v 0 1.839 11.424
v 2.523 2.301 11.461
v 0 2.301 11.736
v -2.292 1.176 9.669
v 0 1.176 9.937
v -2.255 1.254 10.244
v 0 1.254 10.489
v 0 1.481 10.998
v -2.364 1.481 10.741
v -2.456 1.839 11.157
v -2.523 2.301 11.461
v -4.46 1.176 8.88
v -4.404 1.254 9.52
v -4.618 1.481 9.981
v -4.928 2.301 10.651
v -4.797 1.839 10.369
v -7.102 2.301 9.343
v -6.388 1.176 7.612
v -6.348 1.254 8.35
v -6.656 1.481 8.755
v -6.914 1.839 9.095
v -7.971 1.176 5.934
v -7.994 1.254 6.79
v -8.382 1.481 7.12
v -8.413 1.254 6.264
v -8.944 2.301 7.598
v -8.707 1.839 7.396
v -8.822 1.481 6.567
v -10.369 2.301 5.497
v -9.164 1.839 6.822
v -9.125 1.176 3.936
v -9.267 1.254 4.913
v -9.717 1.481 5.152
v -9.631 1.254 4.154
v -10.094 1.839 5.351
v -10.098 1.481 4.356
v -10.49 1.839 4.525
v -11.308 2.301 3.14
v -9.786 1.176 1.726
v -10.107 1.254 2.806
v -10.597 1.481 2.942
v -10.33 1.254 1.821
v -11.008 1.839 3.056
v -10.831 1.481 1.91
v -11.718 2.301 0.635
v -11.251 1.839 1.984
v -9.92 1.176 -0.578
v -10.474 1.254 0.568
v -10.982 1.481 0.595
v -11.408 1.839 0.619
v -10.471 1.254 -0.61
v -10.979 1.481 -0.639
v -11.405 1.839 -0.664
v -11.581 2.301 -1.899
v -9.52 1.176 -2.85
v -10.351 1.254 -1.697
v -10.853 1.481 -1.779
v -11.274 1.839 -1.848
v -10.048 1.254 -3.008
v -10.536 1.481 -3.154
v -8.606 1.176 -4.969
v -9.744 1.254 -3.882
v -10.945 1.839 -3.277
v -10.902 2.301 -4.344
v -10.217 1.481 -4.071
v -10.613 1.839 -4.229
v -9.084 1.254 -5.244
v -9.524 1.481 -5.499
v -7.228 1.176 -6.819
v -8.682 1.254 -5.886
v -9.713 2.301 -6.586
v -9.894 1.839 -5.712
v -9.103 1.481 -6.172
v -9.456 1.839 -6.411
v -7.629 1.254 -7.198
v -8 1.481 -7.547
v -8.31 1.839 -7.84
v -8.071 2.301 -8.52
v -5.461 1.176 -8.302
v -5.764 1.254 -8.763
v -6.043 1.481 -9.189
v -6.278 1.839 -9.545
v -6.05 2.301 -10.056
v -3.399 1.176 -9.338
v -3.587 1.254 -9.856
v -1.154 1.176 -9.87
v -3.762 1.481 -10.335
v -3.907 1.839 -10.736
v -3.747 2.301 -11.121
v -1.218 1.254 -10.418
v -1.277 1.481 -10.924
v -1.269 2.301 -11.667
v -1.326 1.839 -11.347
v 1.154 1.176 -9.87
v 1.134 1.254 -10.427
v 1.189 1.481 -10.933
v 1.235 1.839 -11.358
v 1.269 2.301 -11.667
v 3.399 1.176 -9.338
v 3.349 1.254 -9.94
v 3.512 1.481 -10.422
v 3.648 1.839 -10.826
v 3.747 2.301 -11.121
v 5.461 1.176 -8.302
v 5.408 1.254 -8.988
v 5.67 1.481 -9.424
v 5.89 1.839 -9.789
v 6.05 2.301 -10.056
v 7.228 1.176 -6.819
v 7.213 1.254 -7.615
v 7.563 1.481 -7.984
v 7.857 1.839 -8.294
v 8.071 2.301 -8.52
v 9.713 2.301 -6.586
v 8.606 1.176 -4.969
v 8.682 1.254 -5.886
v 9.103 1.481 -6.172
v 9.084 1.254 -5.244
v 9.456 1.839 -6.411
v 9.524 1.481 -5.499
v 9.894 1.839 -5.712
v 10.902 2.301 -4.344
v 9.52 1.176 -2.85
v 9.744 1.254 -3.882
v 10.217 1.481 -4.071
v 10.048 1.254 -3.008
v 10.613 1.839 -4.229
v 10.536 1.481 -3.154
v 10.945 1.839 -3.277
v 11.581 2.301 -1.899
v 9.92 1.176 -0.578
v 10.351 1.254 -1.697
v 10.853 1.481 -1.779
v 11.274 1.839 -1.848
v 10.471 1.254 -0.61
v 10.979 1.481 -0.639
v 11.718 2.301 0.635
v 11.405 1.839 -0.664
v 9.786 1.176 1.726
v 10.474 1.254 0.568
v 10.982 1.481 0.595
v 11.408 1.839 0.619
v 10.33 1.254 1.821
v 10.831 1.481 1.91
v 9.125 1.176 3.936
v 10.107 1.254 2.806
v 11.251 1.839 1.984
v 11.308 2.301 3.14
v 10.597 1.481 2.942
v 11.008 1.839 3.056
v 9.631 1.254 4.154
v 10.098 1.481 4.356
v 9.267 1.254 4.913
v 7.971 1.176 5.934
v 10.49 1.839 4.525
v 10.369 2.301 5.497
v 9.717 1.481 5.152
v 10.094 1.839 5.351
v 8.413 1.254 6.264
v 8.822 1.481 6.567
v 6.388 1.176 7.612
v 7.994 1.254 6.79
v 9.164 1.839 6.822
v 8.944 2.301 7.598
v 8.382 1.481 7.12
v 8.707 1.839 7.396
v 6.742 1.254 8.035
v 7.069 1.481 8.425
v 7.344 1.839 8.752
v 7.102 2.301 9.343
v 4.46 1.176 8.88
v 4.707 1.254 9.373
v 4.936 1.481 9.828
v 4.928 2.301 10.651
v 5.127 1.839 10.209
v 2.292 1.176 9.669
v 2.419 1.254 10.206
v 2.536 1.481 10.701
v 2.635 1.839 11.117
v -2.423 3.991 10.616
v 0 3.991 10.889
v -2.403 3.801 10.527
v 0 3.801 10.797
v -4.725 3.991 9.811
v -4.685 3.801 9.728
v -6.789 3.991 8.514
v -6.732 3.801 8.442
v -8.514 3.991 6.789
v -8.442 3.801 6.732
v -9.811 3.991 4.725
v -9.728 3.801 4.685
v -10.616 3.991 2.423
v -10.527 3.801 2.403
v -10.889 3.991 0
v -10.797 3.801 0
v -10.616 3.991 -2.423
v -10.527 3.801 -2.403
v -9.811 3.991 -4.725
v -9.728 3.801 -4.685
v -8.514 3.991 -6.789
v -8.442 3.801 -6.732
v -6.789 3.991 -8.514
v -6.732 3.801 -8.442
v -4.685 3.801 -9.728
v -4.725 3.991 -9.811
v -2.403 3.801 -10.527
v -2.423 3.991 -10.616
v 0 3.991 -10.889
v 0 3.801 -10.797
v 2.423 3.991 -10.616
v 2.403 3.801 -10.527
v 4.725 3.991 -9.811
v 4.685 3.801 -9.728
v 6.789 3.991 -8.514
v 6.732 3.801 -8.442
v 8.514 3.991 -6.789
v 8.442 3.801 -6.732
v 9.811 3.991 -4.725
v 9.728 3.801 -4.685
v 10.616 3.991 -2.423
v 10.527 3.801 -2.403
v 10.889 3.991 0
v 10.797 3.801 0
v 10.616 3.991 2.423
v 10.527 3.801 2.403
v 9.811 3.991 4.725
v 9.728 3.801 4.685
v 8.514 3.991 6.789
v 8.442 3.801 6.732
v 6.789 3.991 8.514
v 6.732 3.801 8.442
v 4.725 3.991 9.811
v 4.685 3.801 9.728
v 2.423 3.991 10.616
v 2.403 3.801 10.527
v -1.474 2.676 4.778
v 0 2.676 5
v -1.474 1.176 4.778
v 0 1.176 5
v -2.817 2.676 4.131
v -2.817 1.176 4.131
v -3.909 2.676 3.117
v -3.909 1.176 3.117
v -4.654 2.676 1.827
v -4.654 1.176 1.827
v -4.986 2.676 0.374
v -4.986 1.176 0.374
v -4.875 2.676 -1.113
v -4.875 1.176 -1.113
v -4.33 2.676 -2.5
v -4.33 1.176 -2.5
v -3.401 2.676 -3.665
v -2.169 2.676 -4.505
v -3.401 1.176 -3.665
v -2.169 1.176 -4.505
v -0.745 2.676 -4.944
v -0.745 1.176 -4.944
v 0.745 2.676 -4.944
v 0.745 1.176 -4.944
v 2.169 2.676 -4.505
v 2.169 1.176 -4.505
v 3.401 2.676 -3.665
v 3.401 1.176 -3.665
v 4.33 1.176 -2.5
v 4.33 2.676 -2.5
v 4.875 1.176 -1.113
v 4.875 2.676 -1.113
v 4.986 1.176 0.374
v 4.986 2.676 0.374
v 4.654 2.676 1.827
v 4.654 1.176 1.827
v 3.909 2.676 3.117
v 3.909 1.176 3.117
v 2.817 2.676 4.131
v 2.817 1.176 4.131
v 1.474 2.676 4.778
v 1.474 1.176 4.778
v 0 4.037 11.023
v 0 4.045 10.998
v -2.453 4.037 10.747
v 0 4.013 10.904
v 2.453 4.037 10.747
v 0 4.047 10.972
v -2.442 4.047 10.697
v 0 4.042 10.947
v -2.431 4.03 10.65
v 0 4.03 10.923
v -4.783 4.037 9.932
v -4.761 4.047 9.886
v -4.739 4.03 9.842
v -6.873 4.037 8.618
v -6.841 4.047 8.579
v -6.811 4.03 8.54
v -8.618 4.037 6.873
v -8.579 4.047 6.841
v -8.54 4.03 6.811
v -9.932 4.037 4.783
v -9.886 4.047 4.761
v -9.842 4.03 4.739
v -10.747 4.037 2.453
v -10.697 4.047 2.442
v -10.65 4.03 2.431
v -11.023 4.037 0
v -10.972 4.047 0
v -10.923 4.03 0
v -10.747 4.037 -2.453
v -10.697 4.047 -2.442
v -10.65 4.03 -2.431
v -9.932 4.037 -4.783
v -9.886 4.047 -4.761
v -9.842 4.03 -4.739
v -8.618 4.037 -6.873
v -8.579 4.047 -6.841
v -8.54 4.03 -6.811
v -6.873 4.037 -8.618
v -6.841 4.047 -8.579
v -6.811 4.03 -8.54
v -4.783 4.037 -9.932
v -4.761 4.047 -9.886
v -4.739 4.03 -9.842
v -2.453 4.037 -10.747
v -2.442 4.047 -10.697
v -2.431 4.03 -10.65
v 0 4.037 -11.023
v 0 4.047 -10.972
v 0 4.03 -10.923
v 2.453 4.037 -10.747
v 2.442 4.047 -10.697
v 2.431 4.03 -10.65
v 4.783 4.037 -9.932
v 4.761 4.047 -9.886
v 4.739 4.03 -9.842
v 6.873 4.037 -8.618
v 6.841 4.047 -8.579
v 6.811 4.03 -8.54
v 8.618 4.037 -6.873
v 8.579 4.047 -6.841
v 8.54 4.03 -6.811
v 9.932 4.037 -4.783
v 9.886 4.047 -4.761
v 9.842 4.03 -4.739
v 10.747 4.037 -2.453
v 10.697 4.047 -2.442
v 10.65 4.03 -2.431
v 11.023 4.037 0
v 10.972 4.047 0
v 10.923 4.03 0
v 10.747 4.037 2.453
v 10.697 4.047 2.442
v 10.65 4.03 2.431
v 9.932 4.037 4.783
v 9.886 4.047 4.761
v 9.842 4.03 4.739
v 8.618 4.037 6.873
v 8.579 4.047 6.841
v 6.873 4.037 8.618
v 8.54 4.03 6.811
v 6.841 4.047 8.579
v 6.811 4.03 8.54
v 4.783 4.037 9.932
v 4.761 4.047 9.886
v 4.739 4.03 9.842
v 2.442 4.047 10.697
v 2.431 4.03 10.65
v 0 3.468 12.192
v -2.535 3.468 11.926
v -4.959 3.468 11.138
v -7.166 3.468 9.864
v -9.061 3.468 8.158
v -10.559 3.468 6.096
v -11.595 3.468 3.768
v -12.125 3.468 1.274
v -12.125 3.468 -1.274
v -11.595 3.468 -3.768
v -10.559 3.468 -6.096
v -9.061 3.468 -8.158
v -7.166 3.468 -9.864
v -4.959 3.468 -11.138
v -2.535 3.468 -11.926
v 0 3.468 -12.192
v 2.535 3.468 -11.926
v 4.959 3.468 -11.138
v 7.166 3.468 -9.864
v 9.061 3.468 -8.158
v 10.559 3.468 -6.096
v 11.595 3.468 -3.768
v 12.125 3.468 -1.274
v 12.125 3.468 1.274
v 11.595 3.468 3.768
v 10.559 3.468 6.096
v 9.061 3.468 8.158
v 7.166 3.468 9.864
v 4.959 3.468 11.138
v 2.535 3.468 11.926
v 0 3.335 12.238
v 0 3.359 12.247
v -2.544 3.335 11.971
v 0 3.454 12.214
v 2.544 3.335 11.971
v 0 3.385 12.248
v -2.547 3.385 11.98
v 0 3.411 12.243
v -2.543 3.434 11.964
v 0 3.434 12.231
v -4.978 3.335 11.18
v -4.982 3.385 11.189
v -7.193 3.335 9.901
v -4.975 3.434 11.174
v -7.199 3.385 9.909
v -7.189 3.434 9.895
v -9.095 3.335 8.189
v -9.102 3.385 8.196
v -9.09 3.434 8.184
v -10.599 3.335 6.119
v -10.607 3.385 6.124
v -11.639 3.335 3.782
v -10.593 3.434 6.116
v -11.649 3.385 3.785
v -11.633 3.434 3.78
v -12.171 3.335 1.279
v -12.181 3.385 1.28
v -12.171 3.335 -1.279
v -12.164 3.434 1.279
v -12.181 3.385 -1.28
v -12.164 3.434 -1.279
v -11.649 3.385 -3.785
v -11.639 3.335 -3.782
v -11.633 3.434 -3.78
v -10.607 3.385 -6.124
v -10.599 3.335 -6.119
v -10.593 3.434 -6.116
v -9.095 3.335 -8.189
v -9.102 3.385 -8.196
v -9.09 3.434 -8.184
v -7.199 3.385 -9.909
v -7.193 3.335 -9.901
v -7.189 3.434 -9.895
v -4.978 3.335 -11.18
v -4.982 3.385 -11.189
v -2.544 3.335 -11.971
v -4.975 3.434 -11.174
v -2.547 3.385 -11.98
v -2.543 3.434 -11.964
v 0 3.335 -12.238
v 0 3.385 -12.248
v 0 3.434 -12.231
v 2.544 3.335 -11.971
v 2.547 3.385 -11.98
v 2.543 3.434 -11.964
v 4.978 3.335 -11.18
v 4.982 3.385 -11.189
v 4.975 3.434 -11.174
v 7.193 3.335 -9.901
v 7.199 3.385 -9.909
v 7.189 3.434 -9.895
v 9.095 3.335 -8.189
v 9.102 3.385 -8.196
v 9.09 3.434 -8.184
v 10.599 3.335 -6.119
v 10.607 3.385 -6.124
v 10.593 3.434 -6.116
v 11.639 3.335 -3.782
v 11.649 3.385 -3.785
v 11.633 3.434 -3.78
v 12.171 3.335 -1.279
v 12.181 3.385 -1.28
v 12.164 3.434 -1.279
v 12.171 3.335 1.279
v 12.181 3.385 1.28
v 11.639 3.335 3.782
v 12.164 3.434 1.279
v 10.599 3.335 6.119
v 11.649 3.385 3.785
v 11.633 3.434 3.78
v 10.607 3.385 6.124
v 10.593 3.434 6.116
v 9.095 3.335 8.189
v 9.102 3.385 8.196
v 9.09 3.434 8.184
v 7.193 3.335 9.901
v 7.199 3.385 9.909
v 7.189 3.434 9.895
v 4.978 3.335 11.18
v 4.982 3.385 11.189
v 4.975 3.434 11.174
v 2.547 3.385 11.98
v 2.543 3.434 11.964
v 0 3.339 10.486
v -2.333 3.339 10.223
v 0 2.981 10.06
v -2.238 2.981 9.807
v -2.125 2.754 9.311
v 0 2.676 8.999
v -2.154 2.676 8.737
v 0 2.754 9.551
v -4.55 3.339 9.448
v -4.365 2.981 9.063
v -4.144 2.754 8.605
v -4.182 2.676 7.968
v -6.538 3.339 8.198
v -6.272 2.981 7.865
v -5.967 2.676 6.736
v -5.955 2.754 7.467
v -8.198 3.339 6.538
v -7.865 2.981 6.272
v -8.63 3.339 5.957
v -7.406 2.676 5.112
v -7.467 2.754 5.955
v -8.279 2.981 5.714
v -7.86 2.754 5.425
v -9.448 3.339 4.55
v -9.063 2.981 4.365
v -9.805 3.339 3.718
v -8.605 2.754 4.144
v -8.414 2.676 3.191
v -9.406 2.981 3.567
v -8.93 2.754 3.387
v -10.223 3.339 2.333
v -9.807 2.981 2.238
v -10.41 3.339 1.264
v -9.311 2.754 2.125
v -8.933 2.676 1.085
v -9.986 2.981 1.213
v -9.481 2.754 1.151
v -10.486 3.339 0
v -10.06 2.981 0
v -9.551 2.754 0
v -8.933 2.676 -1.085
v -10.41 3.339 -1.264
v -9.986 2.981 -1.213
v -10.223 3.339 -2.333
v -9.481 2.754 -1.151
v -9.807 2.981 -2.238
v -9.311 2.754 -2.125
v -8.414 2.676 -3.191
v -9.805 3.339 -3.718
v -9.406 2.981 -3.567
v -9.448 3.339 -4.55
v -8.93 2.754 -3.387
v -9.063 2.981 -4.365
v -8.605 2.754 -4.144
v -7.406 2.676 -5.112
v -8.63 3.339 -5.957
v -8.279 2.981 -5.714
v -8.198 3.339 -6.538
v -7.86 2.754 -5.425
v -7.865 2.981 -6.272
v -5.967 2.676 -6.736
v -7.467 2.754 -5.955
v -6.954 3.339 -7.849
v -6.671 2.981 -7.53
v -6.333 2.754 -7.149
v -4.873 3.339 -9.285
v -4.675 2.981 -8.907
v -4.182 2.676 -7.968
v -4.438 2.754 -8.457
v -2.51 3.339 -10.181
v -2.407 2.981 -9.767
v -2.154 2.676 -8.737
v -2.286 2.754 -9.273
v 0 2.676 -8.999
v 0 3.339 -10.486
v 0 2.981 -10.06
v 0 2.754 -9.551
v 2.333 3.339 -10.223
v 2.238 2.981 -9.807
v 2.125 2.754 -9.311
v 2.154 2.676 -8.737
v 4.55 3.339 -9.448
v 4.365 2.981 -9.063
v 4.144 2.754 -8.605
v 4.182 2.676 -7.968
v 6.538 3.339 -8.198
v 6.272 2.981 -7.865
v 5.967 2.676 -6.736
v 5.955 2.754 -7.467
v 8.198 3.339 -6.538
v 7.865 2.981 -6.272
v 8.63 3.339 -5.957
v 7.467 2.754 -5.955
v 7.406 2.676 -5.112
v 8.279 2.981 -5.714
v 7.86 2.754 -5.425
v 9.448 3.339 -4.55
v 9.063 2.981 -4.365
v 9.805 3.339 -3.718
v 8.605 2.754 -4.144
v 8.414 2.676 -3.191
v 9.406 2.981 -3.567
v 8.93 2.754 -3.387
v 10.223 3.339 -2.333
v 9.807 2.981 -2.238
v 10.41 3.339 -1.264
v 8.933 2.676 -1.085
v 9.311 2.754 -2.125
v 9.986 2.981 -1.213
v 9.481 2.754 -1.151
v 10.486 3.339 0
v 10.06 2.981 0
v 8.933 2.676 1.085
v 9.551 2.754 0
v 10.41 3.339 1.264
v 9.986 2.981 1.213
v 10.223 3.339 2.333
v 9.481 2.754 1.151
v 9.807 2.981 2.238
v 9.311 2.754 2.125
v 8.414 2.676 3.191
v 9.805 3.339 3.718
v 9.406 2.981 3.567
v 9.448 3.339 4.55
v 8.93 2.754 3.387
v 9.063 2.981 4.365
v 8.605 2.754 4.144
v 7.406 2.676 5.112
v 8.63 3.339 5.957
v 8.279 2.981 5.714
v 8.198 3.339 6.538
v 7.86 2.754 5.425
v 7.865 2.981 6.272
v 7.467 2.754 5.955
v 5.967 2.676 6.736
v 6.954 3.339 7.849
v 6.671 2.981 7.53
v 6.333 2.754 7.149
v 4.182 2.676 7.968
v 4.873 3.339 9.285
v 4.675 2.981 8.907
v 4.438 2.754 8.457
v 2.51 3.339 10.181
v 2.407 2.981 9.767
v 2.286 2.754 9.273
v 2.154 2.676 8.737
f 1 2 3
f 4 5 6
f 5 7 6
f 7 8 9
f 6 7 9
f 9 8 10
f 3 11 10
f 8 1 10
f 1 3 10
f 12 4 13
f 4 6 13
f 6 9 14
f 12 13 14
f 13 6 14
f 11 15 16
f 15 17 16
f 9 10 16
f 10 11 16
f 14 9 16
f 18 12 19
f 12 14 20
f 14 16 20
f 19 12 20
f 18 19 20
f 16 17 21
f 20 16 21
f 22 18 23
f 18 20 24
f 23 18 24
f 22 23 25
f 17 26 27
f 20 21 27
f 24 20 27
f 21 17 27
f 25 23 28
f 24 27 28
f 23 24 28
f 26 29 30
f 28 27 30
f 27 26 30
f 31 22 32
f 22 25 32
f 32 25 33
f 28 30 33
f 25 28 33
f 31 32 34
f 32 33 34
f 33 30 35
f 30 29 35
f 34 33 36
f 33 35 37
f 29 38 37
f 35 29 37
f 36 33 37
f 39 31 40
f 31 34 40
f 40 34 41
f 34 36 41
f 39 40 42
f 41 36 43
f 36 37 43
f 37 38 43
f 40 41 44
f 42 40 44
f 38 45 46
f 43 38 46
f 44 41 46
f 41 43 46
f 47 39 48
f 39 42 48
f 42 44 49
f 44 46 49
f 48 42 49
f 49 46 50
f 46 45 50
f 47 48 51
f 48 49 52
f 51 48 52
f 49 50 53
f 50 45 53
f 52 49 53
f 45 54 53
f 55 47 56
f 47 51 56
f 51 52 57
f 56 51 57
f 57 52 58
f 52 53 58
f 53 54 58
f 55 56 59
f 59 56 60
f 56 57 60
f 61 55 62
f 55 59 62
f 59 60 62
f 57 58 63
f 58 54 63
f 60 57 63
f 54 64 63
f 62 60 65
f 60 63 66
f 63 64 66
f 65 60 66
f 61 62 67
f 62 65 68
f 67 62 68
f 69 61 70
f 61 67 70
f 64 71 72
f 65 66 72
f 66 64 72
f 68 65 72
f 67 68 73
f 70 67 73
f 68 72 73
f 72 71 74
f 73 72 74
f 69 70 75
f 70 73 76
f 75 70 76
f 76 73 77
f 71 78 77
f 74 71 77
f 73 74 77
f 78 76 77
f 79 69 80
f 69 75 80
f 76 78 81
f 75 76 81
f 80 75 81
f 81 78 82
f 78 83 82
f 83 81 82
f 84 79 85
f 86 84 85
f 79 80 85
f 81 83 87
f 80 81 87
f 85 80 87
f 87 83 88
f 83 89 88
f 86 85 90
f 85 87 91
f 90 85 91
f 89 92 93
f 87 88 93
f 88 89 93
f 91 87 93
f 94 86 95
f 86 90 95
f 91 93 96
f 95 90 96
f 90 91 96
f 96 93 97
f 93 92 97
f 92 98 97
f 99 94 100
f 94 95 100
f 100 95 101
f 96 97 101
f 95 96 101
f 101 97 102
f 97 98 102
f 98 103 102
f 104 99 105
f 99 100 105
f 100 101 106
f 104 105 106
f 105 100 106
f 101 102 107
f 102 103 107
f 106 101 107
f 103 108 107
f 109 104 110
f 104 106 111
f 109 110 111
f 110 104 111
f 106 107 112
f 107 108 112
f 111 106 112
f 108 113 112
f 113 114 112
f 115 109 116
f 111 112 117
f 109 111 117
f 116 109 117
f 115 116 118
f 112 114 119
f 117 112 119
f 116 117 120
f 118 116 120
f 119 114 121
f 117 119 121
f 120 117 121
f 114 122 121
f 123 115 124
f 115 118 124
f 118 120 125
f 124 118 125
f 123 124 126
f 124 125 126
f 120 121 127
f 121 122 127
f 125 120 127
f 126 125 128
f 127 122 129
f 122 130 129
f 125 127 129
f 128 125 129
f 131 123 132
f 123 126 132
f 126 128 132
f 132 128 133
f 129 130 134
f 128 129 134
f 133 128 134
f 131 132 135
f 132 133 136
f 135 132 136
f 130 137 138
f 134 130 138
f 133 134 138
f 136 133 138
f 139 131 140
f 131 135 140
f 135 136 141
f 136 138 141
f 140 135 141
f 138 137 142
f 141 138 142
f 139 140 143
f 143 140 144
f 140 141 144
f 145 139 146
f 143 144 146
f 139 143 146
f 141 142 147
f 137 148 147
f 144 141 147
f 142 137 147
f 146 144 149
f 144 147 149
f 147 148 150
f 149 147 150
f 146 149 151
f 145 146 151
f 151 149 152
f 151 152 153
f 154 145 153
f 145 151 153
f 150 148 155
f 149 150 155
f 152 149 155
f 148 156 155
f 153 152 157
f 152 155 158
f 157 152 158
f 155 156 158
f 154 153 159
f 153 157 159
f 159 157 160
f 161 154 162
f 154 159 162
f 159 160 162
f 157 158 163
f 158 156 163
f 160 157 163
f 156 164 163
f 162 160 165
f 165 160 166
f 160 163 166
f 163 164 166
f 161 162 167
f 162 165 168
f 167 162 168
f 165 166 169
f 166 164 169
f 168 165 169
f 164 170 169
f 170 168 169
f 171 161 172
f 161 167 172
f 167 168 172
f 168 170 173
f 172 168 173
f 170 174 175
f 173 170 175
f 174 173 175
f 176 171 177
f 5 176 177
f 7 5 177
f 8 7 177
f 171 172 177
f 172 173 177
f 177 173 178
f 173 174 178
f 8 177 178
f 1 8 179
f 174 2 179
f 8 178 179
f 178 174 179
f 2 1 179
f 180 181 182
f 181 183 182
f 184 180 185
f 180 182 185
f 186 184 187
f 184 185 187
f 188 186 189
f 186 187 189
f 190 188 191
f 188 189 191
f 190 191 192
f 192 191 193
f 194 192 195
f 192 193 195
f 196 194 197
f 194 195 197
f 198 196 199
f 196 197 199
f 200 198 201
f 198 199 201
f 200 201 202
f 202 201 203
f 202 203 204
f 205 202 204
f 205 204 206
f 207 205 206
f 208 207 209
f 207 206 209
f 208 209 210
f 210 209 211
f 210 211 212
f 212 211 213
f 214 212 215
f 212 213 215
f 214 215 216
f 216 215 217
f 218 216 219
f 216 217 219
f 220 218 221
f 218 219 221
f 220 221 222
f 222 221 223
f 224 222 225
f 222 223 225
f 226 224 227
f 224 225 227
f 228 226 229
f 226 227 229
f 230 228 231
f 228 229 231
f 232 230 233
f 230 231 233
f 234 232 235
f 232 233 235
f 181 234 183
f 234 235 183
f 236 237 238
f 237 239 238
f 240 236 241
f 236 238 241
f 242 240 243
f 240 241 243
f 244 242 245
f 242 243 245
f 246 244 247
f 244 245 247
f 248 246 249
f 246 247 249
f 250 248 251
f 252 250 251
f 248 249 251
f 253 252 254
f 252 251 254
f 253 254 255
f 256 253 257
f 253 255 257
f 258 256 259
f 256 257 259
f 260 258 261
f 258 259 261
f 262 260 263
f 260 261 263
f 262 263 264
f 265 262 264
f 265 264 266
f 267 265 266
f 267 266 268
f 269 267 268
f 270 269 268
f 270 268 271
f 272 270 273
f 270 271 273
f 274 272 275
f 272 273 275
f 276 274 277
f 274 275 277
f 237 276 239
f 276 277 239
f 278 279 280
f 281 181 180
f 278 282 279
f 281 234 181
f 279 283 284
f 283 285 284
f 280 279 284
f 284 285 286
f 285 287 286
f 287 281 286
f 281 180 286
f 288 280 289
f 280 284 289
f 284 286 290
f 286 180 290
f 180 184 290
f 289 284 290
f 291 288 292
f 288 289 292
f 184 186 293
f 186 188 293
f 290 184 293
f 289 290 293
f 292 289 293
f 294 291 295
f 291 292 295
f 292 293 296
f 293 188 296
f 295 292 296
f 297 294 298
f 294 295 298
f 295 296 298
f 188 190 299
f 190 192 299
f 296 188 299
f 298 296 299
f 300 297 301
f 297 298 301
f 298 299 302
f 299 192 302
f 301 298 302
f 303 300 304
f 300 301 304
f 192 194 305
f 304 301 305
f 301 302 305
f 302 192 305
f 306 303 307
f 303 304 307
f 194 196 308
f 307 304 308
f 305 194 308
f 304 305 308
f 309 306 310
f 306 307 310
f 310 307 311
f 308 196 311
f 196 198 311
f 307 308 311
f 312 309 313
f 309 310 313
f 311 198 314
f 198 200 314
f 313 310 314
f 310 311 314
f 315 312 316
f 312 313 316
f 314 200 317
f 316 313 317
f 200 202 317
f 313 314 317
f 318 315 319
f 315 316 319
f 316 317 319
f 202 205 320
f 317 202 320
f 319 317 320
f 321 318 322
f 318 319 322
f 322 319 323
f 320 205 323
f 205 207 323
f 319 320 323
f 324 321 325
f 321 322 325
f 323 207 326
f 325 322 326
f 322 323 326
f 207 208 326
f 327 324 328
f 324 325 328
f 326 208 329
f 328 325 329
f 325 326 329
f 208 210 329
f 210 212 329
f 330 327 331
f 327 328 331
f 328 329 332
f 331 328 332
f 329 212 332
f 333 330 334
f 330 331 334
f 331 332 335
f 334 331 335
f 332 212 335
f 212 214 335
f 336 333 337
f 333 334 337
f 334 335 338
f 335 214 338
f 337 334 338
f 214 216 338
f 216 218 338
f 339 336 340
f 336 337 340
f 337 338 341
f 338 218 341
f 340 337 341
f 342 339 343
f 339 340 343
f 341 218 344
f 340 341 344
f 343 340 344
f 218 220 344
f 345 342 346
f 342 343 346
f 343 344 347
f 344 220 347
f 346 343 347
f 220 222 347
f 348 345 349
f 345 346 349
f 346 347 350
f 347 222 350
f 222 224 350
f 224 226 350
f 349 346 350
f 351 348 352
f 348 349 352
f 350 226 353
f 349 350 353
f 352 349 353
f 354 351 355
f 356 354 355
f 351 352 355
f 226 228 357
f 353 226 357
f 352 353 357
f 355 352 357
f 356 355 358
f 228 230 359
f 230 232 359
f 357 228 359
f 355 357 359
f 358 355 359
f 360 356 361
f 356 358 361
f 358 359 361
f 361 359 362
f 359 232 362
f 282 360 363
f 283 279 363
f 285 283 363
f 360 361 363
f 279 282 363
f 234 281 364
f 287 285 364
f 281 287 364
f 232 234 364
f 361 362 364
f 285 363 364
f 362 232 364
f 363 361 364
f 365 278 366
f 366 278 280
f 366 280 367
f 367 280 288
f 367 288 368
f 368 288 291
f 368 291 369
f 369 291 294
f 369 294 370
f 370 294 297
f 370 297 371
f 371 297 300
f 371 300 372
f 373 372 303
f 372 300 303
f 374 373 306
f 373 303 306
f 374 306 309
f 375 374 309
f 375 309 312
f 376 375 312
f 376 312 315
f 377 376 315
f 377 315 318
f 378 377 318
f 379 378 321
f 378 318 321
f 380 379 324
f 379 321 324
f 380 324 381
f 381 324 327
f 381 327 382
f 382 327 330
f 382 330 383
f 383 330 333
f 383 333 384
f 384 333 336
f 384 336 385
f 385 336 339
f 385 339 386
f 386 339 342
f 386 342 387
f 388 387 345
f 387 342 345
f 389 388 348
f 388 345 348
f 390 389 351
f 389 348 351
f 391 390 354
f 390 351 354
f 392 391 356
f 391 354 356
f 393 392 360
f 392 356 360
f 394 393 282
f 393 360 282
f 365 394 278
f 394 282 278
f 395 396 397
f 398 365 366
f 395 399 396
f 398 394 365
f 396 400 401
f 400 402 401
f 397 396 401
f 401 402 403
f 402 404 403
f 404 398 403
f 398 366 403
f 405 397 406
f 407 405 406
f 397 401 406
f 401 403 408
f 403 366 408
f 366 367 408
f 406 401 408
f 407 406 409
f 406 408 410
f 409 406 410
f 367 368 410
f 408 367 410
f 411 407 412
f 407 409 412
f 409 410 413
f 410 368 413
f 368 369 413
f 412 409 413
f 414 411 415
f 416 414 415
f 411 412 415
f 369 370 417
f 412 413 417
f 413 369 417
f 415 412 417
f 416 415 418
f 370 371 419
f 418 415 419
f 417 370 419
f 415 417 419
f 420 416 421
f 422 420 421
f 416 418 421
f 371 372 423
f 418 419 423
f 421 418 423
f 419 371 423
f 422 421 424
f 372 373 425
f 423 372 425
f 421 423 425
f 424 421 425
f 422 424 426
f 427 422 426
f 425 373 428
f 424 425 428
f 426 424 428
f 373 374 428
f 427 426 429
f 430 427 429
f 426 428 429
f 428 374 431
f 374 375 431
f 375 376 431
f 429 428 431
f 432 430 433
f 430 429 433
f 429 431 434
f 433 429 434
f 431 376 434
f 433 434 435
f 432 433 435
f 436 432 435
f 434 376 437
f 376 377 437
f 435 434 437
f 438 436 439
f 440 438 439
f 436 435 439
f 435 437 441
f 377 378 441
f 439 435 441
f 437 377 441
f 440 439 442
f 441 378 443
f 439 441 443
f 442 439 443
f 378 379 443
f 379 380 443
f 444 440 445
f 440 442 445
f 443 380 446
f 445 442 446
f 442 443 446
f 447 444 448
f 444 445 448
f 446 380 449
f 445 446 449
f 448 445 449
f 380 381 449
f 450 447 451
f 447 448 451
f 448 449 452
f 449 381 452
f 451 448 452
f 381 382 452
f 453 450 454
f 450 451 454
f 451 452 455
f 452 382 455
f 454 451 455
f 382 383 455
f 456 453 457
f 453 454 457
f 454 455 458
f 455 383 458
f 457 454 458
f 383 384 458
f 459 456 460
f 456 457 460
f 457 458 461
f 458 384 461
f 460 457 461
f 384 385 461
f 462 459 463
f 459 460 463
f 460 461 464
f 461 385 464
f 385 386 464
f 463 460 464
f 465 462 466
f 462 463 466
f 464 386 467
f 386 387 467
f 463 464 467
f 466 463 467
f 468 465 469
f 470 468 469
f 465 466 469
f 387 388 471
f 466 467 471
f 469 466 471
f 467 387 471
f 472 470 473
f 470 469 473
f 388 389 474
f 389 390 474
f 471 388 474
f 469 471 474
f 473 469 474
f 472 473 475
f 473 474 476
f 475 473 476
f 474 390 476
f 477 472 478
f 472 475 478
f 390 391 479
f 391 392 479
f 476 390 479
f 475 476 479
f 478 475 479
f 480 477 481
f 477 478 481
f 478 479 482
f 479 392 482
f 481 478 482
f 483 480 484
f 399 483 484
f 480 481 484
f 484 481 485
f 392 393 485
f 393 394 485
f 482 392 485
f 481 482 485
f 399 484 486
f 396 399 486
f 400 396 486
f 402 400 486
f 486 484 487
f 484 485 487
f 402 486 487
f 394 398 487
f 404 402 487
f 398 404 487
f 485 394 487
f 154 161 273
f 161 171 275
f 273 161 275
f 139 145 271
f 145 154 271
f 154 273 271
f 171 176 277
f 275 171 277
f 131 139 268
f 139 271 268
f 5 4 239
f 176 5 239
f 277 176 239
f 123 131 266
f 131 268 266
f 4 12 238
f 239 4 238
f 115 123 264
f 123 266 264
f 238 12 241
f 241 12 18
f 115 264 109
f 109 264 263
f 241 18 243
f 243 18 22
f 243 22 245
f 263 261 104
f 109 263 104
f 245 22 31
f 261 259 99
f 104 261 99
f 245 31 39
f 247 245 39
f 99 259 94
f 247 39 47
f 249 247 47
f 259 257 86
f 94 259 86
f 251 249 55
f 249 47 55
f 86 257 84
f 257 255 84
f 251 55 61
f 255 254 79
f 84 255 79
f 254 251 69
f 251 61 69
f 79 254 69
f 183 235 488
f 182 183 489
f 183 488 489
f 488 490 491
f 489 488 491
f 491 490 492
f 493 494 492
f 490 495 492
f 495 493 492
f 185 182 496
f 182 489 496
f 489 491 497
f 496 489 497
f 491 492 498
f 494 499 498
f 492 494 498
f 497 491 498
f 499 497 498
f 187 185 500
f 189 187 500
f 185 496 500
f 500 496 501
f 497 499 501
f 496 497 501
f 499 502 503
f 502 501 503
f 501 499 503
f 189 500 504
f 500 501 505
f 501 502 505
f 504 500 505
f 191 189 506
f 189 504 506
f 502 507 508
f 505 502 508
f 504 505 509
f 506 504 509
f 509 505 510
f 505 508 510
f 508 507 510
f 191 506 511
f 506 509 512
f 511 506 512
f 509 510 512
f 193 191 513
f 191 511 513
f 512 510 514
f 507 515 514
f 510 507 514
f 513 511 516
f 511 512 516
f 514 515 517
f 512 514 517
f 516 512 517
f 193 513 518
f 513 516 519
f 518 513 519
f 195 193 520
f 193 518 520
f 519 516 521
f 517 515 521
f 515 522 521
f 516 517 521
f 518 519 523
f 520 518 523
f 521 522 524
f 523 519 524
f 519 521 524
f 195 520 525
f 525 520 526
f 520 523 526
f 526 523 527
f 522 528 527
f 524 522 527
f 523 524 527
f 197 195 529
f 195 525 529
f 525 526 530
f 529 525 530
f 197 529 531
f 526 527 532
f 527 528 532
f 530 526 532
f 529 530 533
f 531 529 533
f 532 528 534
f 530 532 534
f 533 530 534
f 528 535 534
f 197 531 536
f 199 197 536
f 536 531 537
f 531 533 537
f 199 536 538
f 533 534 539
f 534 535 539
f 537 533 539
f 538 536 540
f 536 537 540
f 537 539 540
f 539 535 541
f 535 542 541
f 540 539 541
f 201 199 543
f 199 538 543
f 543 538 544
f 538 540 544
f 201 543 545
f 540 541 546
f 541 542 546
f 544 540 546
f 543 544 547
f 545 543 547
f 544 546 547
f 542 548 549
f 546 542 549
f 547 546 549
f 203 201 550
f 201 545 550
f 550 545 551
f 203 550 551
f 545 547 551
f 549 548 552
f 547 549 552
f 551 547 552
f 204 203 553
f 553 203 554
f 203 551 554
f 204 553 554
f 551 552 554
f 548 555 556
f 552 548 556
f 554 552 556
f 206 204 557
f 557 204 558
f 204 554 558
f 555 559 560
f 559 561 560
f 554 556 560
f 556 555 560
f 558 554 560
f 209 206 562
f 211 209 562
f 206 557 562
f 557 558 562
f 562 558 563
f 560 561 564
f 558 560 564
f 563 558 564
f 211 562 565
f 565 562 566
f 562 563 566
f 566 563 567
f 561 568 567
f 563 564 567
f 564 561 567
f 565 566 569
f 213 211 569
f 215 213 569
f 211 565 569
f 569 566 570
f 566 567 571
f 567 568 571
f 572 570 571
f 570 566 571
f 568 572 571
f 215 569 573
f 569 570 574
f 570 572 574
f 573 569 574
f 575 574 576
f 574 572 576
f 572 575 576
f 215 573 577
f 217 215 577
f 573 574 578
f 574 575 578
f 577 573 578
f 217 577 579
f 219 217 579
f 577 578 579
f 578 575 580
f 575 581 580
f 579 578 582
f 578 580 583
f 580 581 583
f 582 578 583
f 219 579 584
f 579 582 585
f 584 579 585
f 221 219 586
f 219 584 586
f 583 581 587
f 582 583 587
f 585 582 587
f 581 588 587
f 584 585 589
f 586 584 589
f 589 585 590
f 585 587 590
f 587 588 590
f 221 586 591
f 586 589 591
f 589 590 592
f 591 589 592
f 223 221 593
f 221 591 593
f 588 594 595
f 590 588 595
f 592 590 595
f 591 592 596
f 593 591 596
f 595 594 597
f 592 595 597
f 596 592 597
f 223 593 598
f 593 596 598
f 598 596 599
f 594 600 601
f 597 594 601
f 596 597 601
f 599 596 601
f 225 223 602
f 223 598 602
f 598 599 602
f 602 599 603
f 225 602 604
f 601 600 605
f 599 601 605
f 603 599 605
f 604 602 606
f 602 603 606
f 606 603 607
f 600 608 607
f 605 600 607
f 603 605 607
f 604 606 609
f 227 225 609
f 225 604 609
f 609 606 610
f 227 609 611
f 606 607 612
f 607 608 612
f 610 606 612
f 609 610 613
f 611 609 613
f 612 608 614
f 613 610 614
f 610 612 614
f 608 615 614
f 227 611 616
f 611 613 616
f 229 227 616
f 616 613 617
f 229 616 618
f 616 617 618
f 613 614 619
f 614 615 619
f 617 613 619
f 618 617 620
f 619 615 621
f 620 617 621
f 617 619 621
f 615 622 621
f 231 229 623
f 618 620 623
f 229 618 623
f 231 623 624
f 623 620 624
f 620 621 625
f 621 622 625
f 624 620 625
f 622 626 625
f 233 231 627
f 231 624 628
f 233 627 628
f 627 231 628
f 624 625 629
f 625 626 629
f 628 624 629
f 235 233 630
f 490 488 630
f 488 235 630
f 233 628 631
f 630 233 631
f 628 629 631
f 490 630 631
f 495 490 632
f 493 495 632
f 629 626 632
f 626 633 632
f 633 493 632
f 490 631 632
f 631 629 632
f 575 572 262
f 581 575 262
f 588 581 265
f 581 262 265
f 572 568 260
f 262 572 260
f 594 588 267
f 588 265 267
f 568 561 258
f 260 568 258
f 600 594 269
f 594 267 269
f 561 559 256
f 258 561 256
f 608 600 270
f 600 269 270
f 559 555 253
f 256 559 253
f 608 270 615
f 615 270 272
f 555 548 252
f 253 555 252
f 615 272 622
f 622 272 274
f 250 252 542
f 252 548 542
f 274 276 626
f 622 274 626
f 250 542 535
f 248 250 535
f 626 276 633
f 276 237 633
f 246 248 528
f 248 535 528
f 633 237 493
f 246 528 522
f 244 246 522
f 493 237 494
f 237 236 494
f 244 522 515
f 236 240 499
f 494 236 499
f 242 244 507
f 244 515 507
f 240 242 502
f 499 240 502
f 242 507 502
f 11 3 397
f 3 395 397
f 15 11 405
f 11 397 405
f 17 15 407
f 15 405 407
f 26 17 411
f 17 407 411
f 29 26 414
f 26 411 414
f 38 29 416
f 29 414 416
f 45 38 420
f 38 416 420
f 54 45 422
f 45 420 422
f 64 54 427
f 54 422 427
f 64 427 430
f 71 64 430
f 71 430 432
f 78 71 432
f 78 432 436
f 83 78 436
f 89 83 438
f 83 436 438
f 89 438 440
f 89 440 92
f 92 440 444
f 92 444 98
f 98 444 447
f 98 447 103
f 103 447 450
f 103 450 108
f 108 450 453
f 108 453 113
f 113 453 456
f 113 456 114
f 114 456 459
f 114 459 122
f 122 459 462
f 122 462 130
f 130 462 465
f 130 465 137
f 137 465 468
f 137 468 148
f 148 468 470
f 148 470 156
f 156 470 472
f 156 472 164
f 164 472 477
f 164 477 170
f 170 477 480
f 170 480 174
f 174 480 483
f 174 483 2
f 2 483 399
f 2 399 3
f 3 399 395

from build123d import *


with BuildPart() as part:
    # Sketch1 → Revolve1 (revolve)
    with BuildSketch(Plane.XY, mode=Mode.PRIVATE) as revolve1_sk:
        with BuildLine():
            Line((5, 1.176406116), (9.93722571, 1.176406116))
            ThreePointArc((9.93722571, 1.176406116), (10.997892387, 1.480827689), (11.735669245, 2.301419916))
            Line((11.735669245, 2.301419916), (12.23830631, 3.334538358))
            ThreePointArc((12.23830631, 3.334538358), (12.242904148, 3.410936815), (12.192133443, 3.468209845))
            Line((12.192133443, 3.468209845), (11.023145145, 4.036950875))
            ThreePointArc((11.023145145, 4.036950875), (10.946746688, 4.041548713), (10.889473658, 3.990778008))
            Line((10.889473658, 3.990778008), (10.797346375, 3.801419916))
            ThreePointArc((10.797346375, 3.801419916), (10.059569517, 2.980827689), (8.99890284, 2.676406116))
            Line((8.99890284, 2.676406116), (5, 2.676406116))
            Line((5, 2.676406116), (5, 1.176406116))
        make_face()
    revolve(revolve1_sk.sketch.rotate(Axis((0, 4.371150449, 0), (0, -1, 0)), 90), axis=Axis((0, 4.371150449, 0), (0, -1, 0)))


solid = part.part
